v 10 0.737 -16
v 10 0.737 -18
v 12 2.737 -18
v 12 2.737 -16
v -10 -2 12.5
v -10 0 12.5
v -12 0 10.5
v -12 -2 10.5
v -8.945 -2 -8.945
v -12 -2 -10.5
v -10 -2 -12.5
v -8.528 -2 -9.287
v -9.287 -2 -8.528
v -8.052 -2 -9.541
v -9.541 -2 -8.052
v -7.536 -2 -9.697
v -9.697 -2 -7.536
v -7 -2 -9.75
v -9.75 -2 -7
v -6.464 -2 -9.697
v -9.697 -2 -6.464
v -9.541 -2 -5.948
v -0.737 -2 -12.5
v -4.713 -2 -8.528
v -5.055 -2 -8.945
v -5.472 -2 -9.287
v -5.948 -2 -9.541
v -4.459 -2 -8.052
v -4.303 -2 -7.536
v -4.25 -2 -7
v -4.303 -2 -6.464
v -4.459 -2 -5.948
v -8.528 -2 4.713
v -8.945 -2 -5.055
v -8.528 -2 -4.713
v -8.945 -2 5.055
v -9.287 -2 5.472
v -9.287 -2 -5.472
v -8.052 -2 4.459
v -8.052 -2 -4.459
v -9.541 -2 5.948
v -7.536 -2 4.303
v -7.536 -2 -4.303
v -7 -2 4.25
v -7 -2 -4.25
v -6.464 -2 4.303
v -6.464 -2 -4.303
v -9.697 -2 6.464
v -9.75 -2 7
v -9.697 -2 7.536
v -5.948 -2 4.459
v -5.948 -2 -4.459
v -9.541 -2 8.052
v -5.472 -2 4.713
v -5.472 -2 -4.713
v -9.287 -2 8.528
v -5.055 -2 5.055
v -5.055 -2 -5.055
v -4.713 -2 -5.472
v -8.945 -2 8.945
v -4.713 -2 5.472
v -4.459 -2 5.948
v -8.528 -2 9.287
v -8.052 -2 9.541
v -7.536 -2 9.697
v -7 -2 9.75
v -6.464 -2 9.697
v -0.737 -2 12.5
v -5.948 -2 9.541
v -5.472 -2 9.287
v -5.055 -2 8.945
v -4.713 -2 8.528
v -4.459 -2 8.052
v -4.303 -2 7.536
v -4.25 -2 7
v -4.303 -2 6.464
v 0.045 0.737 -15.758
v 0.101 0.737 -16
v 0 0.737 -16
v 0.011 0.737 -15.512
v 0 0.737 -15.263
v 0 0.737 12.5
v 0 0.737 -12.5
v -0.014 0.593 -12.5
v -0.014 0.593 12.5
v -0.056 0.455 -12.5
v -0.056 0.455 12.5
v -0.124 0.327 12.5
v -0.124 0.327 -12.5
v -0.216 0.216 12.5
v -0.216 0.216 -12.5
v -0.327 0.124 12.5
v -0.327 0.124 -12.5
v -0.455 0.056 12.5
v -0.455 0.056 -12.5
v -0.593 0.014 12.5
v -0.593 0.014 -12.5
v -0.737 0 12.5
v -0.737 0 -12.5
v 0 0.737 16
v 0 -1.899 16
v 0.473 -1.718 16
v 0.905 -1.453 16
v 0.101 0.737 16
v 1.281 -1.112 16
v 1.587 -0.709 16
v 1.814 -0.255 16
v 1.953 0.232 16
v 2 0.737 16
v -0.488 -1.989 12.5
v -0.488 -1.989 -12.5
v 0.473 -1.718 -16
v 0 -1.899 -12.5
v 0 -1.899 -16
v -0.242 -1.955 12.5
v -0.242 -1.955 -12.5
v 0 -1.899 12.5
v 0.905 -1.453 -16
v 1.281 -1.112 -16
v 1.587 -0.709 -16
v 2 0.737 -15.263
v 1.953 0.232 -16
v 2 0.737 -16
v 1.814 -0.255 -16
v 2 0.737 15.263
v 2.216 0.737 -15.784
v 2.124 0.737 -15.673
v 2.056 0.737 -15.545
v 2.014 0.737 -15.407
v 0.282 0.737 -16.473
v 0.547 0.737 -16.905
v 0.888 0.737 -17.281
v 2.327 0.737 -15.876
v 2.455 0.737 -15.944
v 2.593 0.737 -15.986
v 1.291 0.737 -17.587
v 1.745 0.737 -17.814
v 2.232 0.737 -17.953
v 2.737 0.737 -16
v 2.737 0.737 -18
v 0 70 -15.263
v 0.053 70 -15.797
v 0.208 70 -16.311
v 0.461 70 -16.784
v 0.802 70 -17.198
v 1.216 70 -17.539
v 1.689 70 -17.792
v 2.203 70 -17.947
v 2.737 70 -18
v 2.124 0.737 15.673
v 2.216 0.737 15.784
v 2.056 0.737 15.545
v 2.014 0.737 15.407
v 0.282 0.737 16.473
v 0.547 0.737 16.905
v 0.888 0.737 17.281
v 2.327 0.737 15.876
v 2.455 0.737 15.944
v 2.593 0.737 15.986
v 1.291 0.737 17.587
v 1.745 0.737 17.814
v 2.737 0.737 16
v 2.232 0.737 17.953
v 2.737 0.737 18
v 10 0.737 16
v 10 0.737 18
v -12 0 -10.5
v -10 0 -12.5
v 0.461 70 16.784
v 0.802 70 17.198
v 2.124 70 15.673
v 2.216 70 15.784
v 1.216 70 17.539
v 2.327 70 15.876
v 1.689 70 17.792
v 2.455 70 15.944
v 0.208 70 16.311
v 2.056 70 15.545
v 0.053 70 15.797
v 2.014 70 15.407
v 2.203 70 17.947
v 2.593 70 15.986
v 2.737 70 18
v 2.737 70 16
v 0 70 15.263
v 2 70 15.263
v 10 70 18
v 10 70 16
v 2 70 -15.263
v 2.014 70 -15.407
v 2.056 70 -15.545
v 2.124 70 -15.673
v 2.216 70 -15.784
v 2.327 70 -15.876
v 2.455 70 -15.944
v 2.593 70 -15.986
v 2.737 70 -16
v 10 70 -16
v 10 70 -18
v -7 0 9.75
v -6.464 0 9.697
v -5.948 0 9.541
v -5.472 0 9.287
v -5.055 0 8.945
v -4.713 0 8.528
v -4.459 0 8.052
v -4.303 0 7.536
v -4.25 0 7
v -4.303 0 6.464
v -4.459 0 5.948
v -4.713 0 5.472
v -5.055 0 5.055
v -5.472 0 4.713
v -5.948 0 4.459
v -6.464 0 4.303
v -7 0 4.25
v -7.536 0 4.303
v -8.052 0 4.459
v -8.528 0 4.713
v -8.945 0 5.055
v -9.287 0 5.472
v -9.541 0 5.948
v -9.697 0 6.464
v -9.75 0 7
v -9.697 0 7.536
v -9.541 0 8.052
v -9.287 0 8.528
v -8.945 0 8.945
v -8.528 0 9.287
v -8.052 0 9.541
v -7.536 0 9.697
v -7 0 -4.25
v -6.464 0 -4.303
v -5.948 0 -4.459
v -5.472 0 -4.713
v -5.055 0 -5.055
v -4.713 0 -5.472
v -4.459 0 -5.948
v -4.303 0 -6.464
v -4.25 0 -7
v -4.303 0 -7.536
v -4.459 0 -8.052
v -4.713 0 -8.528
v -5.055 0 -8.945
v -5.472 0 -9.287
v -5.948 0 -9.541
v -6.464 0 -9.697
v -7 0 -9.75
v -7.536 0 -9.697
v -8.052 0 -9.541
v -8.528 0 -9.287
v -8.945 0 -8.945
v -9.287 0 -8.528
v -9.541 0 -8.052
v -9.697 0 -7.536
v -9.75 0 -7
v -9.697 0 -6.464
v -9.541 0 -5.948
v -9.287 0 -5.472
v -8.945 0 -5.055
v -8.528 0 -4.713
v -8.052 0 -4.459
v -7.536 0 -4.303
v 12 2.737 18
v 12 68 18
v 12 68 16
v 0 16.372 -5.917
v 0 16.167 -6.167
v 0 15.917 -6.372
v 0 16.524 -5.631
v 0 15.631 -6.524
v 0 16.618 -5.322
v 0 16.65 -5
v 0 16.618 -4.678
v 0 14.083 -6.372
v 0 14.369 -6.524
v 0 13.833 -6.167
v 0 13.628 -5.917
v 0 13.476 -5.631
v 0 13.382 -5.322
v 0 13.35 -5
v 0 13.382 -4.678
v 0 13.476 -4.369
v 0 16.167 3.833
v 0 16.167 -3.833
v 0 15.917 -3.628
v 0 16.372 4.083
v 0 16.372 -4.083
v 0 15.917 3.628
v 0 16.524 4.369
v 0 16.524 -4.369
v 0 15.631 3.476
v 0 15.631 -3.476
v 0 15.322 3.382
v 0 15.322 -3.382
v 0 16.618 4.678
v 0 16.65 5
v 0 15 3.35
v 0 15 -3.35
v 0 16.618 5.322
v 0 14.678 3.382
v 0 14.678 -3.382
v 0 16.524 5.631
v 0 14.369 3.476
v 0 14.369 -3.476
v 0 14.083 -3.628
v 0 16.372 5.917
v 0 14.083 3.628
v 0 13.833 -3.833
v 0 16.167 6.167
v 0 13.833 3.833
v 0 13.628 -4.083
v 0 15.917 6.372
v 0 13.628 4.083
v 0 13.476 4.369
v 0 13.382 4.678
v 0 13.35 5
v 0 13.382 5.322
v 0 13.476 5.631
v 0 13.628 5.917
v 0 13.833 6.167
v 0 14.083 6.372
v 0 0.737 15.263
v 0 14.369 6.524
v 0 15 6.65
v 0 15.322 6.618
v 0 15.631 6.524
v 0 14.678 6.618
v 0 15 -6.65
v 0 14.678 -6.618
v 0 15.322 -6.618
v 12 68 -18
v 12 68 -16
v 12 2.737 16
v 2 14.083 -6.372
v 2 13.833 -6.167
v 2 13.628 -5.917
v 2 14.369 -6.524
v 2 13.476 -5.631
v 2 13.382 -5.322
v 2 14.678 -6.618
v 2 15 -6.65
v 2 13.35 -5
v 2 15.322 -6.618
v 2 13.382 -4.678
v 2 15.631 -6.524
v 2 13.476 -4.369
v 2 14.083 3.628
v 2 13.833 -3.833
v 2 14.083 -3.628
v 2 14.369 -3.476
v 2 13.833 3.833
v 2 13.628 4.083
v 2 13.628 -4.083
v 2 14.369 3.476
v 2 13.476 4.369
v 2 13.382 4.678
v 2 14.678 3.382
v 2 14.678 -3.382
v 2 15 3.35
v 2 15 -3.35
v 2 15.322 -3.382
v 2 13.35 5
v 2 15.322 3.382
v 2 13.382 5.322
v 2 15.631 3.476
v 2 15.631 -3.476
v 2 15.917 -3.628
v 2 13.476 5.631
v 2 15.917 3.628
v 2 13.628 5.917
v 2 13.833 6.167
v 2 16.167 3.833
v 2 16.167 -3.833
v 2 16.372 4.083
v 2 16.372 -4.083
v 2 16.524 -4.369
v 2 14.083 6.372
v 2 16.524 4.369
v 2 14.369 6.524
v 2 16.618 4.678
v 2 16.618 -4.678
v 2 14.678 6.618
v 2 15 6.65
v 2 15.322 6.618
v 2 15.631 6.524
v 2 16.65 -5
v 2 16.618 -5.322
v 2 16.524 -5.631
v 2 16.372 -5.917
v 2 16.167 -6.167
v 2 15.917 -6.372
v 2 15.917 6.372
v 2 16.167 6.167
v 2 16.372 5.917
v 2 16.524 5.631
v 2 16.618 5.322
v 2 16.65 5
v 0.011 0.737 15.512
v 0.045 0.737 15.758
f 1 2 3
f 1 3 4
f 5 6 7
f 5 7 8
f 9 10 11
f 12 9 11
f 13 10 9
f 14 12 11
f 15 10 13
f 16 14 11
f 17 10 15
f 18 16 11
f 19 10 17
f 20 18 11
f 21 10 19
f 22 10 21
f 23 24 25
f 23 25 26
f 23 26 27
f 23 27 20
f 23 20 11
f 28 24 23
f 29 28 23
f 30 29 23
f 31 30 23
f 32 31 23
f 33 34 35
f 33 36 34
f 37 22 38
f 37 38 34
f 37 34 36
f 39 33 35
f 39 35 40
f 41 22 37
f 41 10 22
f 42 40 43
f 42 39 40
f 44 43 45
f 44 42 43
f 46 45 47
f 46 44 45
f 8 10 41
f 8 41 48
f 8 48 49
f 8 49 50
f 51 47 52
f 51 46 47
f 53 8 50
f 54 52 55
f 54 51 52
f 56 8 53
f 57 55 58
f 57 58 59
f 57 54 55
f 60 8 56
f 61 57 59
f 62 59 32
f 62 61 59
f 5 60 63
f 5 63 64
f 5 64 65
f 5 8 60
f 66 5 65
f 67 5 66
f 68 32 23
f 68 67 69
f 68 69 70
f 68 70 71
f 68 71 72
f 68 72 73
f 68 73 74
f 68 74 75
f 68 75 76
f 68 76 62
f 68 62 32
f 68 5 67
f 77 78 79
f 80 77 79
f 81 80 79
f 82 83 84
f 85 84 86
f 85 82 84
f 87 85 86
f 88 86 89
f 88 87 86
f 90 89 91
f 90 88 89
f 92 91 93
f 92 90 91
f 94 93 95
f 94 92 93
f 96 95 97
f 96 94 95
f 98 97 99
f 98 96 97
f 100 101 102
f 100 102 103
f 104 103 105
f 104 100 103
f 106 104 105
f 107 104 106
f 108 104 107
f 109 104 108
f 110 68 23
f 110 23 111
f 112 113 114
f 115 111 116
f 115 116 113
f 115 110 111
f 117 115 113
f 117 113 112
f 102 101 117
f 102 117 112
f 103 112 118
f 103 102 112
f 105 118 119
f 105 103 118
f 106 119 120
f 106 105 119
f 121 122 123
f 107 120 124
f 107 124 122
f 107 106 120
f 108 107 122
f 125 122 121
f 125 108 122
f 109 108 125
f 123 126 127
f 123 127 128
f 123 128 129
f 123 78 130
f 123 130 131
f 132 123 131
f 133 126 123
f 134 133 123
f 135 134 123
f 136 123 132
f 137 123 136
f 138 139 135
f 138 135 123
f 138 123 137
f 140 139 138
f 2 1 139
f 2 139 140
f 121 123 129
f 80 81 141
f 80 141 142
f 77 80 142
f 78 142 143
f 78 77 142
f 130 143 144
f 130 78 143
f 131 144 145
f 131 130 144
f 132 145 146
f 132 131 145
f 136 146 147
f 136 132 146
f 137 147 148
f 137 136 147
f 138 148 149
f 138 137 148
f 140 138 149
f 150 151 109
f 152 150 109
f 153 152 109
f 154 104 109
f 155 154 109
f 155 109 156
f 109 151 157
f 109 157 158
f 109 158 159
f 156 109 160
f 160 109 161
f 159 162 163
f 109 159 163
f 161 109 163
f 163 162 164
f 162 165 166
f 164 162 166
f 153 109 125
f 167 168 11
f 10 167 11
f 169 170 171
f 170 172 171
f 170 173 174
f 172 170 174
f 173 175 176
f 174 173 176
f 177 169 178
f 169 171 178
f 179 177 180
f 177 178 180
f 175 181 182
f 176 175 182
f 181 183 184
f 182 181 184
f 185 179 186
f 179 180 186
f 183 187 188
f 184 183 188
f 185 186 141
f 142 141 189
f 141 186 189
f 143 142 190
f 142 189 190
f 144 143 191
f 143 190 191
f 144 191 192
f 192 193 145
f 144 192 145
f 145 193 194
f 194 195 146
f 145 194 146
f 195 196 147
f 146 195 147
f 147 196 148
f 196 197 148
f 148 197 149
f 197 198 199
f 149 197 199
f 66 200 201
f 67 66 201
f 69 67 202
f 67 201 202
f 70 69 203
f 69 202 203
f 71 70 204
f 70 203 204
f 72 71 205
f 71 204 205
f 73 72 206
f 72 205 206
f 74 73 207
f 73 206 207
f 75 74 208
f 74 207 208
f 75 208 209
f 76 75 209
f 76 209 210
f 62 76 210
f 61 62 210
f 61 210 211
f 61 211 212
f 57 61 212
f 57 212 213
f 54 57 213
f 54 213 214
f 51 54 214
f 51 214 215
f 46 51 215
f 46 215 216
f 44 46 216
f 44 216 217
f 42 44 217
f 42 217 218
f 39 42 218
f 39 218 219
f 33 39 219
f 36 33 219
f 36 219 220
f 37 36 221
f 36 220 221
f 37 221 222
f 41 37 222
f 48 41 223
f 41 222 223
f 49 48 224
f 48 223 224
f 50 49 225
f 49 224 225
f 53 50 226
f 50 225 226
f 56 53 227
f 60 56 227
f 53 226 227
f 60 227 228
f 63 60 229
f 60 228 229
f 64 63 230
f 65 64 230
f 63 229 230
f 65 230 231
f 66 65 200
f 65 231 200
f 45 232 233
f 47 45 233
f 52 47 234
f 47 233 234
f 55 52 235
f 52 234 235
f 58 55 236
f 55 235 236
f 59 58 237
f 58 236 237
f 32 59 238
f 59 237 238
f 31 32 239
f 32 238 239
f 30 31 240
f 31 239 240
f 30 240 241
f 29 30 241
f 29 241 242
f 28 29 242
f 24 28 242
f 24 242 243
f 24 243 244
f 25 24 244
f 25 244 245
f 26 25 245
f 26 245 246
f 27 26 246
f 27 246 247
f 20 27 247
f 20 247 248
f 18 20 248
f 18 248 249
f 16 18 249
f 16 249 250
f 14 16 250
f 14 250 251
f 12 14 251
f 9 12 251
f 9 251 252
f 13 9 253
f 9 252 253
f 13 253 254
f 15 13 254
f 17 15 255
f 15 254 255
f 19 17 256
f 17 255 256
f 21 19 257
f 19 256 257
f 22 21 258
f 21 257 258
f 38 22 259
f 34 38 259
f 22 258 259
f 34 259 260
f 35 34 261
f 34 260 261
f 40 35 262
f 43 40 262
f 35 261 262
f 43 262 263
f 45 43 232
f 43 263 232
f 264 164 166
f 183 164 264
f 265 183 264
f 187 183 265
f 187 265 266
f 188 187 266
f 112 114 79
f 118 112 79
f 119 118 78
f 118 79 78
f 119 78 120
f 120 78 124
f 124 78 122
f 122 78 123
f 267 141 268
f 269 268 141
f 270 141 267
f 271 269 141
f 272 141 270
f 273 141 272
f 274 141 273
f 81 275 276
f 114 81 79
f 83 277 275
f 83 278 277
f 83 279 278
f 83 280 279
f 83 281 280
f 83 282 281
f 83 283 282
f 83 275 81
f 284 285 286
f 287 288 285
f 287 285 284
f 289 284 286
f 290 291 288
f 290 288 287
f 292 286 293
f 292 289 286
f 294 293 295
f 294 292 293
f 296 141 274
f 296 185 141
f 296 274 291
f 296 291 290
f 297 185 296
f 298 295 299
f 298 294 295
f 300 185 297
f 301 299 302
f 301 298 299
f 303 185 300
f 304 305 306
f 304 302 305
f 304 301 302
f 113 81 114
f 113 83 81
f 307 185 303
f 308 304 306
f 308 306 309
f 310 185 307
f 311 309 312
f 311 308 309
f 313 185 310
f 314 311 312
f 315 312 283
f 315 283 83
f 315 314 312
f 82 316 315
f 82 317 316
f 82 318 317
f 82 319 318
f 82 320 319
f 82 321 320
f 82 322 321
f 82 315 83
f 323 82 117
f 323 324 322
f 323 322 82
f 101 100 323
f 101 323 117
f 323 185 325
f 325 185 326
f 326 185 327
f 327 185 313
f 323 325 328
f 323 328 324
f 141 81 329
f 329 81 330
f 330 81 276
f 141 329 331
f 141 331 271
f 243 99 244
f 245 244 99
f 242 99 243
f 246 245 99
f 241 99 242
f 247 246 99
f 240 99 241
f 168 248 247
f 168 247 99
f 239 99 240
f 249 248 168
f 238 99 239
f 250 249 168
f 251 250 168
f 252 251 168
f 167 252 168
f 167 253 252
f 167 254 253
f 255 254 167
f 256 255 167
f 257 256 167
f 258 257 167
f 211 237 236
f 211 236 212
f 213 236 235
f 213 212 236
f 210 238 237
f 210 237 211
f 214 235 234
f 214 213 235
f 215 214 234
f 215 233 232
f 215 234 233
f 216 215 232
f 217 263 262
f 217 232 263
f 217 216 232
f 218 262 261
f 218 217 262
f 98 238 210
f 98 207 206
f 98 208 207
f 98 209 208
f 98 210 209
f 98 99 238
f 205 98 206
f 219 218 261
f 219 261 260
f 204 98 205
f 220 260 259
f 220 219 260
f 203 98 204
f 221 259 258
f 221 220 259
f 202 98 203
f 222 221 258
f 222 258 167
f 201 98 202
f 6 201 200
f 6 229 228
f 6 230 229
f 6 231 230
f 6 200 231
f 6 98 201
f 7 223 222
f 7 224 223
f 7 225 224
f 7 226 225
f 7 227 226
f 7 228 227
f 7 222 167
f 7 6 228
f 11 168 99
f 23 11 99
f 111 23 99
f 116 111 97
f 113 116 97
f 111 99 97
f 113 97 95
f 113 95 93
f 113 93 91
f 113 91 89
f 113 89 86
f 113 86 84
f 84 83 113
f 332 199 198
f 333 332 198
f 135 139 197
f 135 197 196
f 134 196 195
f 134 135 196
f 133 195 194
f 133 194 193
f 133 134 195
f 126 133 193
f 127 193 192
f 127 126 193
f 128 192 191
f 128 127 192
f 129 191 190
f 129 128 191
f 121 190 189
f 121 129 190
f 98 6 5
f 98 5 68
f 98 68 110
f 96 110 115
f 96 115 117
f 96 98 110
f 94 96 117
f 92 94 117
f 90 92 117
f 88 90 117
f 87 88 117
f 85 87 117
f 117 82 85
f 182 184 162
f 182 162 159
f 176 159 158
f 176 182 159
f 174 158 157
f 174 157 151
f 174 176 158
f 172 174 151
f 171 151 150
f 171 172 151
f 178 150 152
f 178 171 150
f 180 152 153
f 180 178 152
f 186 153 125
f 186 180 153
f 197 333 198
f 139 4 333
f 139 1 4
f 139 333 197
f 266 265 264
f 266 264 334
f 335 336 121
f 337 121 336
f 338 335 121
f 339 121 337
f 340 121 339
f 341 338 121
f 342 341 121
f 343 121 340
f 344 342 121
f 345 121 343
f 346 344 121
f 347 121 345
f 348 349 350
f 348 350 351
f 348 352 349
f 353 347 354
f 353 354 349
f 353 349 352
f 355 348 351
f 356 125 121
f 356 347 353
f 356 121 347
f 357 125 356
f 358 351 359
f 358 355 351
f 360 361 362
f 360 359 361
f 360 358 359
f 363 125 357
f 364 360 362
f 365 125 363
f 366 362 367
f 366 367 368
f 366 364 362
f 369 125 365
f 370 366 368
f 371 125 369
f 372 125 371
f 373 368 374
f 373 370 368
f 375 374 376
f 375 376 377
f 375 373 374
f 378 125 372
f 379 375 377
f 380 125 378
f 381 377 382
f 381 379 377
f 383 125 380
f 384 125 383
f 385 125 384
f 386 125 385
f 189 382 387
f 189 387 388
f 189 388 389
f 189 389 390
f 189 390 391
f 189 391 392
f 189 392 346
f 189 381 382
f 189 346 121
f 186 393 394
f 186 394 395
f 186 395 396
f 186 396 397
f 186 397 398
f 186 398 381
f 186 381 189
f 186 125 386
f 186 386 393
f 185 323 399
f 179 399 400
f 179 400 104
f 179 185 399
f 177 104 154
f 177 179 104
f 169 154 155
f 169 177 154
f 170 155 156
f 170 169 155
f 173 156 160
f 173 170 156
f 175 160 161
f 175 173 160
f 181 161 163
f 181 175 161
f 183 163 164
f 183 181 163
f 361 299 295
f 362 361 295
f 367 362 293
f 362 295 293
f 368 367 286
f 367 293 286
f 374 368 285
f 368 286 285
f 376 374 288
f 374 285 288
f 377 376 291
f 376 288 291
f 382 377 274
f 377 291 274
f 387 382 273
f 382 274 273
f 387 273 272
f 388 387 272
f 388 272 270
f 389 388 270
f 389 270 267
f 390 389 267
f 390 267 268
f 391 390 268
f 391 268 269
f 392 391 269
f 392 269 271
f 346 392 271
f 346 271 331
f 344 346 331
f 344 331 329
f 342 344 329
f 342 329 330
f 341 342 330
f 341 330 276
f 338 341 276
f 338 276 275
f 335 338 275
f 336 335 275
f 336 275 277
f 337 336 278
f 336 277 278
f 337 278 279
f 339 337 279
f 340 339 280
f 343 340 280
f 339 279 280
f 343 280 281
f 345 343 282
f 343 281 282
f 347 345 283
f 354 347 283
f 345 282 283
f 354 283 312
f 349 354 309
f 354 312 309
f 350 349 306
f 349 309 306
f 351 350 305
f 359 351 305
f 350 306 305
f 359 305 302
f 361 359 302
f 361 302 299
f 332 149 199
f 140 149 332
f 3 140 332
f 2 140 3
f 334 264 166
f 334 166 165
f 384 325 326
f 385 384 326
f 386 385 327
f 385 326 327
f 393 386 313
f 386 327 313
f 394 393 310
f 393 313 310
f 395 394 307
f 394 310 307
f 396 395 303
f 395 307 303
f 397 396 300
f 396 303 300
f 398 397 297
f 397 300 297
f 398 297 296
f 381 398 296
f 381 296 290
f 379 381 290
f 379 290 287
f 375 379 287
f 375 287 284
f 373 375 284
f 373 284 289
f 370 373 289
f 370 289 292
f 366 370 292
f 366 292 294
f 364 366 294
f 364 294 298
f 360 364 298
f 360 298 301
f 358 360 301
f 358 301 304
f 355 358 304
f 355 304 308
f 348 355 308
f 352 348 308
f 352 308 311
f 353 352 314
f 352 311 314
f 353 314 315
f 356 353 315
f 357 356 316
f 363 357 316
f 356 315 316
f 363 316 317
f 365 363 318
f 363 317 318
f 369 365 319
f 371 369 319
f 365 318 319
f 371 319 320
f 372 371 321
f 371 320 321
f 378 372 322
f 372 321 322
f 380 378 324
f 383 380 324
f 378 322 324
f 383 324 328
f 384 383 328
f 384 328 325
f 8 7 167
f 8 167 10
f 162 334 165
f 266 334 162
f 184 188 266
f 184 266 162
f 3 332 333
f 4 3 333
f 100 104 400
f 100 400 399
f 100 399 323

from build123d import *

# Parameters (mm, degrees)
SM_BASE_FLANGE_1_DEPTH             = 16
SKETCH_3_R                         = 2.75
CUT_EXTRUDE_1_DEPTH                = 73.801098893
SKETCH_4_W                         = 12
SKETCH_4_H                         = 3.5
CUT_EXTRUDE_2_DEPTH                = 75.726166769
SM_EDGE_FLANGE_1_STRIP_W           = 9.4732
SM_EDGE_FLANGE_1_STRIP_H           = 2
SM_EDGE_FLANGE_1_STRIP_CUT_DEPTH   = 69.2634
SM_EDGE_FLANGE_1_STRIP_2_W         = 9.4732
SM_EDGE_FLANGE_1_STRIP_2_H         = 2
SM_EDGE_FLANGE_1_STRIP_CUT_2_DEPTH = 69.2634
SM_EDGE_FLANGE_1_DEPTH             = 69.2634
SM_EDGE_FLANGE_1_BEND_DEPTH        = 69.2634
M4X0_7_1_D                         = 3.3
M4X0_7_1_DEPTH                     = 10.1
M4X0_7_1_TIP                       = 0.991420021
CHAMFER_1_SIZE                     = 2


# Sheet-metal steps are written as plain solids
with BuildPart() as part:
    # Sketch 1 → 基体-法兰1 (new, symmetric)
    with BuildSketch(Plane.XY):
        with BuildLine():
            Line((0, 70), (0, 0.7366))
            ThreePointArc((0, 0.7366), (-0.215745145, 0.215745145), (-0.7366, 0))
            Line((-0.7366, 0), (-12, 0))
            Line((-12, 0), (-12, -2))
            Line((-12, -2), (-0.7366, -2))
            ThreePointArc((-0.7366, -2), (1.198468417, -1.198468417), (2, 0.7366))
            Line((2, 0.7366), (2, 70))
            Line((2, 70), (0, 70))
        make_face()
    extrude(amount=SM_BASE_FLANGE_1_DEPTH, both=True)

    # 草图3 → 切除-拉伸1 (cut, through all)
    with BuildSketch(Plane(origin=(0, 0, 0), x_dir=(1, 0, 0), z_dir=(0, 1, 0))):
        with Locations(Location((-7, 7, 0), (0, 0, 270))):
            Circle(SKETCH_3_R)
        with Locations(Location((-7, -7, 0), (0, 0, 270))):
            Circle(SKETCH_3_R)
    extrude(amount=-CUT_EXTRUDE_1_DEPTH, mode=Mode.SUBTRACT)

    # 草图4 → 切除-拉伸2 (cut, through all)
    with BuildSketch(Plane(origin=(0, 70, 0), x_dir=(1, 0, 0), z_dir=(0, 1, 0))):
        with Locations((-6, 14.25)):
            Rectangle(SKETCH_4_W, SKETCH_4_H)
        with Locations((-6, -14.25)):
            Rectangle(SKETCH_4_W, SKETCH_4_H)
    extrude(amount=-CUT_EXTRUDE_2_DEPTH, mode=Mode.SUBTRACT)

    # 边线-法兰1 strip (across the edge) → 边线-法兰1 strip cut (cut)
    with BuildSketch(Plane(origin=(2, 70, 16), x_dir=(0, 0, -1), z_dir=(0, -1, 0))):
        with Locations((-4, -1)):
            Rectangle(SM_EDGE_FLANGE_1_STRIP_W, SM_EDGE_FLANGE_1_STRIP_H)
    extrude(amount=SM_EDGE_FLANGE_1_STRIP_CUT_DEPTH, mode=Mode.SUBTRACT)

    # 边线-法兰1 strip 2 (across the edge) → 边线-法兰1 strip cut 2 (cut)
    with BuildSketch(Plane(origin=(2, 0.7366, -16), x_dir=(0, 0, 1), z_dir=(0, 1, 0))):
        with Locations((-4, -1)):
            Rectangle(SM_EDGE_FLANGE_1_STRIP_2_W, SM_EDGE_FLANGE_1_STRIP_2_H)
    extrude(amount=SM_EDGE_FLANGE_1_STRIP_CUT_2_DEPTH, mode=Mode.SUBTRACT)

    # 边线-法兰1 section (across the edge) → 边线-法兰1 (add)
    with BuildSketch(Plane(origin=(2, 70, 16), x_dir=(0, 0, -1), z_dir=(0, -1, 0))):
        with BuildLine():
            Line((-2, 0.7366), (-2, 10))
            Line((-2, 10), (0, 10))
            Line((0, 10), (0, 0.7366))
            ThreePointArc((0, 0.7366), (0.215745145, 0.215745145), (0.7366, 0))
            Line((0.7366, 0), (0.7366, -2))
            ThreePointArc((0.7366, -2), (-1.198468417, -1.198468417), (-2, 0.7366))
        make_face()
    extrude(amount=SM_EDGE_FLANGE_1_DEPTH)

    # 边线-法兰1 section 2 (across the edge) → 边线-法兰1 bend (add)
    with BuildSketch(Plane(origin=(2, 0.7366, -16), x_dir=(0, 0, 1), z_dir=(0, 1, 0))):
        with BuildLine():
            Line((-2, 0.7366), (-2, 10))
            Line((-2, 10), (0, 10))
            Line((0, 10), (0, 0.7366))
            ThreePointArc((0, 0.7366), (0.215745145, 0.215745145), (0.7366, 0))
            Line((0.7366, 0), (0.7366, -2))
            ThreePointArc((0.7366, -2), (-1.198468417, -1.198468417), (-2, 0.7366))
        make_face()
    extrude(amount=SM_EDGE_FLANGE_1_BEND_DEPTH)

    # M4x0.7 螺纹孔1
    with Locations(Plane(origin=(2, 0, 0), x_dir=(0, 0, -1), z_dir=(1, 0, 0))):
        with Locations((-5, 15), (5, 15)):
            Hole(M4X0_7_1_D / 2, depth=M4X0_7_1_DEPTH)
            with Locations((0, 0, -(M4X0_7_1_DEPTH + M4X0_7_1_TIP / 2))):  # 118° drill point
                Cone(0, M4X0_7_1_D / 2, M4X0_7_1_TIP, mode=Mode.SUBTRACT)

    # 倒角1
    chamfer_1_edges = [part.edges().sort_by_distance(p)[0] for p in [
        (12, 70, 17),
        (12, 0.7366, 17),
        (12, 0.7366, -17),
        (12, 70, -17),
        (-12, -1, -12.5),
        (-12, -1, 12.5),
    ]]
    chamfer(chamfer_1_edges, length=CHAMFER_1_SIZE)


solid = part.part
